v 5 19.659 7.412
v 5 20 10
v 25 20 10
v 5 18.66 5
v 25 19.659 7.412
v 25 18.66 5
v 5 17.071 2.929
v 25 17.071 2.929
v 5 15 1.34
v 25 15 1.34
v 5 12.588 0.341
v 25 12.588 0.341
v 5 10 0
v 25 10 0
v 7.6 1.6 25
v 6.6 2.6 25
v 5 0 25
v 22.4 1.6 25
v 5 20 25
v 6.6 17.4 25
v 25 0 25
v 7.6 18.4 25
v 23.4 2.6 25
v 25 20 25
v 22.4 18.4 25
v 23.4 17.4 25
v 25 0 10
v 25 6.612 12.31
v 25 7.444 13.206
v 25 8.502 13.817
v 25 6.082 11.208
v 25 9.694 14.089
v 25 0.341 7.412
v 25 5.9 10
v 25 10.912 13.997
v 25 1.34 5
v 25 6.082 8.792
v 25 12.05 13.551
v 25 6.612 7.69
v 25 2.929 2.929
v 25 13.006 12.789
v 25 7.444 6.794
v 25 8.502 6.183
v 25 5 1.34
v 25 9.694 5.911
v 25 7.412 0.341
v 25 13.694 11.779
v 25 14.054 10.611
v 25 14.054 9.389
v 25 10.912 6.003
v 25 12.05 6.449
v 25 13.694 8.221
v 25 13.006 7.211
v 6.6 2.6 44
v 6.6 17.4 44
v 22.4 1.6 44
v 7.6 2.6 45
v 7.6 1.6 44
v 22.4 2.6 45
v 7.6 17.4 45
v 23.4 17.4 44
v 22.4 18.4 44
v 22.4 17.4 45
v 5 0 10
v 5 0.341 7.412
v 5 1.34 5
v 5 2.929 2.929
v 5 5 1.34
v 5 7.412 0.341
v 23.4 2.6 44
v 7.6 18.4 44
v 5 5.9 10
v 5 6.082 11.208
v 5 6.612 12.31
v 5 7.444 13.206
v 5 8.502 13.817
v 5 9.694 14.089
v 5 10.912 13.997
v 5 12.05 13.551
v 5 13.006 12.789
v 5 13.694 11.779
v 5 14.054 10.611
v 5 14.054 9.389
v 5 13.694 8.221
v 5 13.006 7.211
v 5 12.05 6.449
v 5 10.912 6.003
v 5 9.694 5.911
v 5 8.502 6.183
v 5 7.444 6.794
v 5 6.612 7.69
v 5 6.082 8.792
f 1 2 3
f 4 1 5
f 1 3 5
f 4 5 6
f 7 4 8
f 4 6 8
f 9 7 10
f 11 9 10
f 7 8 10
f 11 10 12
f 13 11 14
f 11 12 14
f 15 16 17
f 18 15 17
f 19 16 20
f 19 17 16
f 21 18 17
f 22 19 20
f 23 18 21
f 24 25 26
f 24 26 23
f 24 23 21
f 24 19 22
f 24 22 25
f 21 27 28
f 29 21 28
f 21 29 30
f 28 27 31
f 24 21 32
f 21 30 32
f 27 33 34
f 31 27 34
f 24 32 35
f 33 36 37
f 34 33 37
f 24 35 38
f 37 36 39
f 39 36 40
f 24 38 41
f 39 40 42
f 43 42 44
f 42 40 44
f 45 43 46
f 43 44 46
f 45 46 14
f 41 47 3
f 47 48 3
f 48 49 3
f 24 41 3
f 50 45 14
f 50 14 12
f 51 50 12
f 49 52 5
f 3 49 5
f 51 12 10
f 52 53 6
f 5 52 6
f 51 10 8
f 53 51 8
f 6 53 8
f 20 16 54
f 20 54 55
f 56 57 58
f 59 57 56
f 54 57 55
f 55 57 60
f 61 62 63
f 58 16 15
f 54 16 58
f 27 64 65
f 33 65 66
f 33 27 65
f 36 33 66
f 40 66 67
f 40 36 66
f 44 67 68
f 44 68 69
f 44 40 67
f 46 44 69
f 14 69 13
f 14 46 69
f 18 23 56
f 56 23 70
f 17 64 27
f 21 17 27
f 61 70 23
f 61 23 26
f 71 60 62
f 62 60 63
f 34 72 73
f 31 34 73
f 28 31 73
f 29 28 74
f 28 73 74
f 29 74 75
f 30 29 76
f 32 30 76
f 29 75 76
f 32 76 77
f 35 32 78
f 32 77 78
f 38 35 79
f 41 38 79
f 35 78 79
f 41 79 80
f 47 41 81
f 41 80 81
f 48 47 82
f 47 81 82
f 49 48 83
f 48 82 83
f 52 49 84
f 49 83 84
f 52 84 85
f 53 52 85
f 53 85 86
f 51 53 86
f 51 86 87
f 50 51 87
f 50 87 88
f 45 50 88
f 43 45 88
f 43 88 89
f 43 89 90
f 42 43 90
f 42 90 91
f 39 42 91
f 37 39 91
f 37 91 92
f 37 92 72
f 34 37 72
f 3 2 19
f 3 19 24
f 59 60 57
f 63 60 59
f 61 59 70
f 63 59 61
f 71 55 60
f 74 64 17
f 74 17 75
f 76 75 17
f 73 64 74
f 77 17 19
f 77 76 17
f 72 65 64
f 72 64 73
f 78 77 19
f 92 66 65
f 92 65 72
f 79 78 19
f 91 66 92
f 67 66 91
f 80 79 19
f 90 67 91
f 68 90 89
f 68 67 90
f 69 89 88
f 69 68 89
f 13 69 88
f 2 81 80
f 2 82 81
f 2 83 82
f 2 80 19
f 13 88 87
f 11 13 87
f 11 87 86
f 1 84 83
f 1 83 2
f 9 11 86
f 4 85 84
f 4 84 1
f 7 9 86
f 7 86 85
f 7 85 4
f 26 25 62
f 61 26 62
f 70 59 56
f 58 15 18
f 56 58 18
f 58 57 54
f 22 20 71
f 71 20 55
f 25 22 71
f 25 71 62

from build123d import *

# Parameters (mm, degrees)
F0_W     = 20
F0_H     = 20
F1_DEPTH = 25
F2_W     = 16.8
F2_H     = 16.8
F3_DEPTH = 20
F4_SIZE  = 1
F5_R     = 9.99999
F7_D     = 8.2
F7_DEPTH = 35
F7_TIP   = 2.463528538


# Not quite as in the source:
# - a fillet or chamfer is up to 0.001 mm smaller than in the source, because OpenCascade refuses the exact size


with BuildPart() as f1:
    # F0 (on Top) → F1 (new body)
    with BuildSketch(Plane.XY):
        with Locations((15, 10)):
            Rectangle(F0_W, F0_H)
    extrude(amount=F1_DEPTH)

    # F2 (on face) → F3 (join)
    with BuildSketch(Plane.XY.offset(25)):
        with Locations((15, 10)):
            Rectangle(F2_W, F2_H)
    extrude(amount=F3_DEPTH)

    # F4
    f4_edges = [f1.edges().sort_by_distance(p)[0] for p in [
        (6.6, 18.4, 35),
        (6.6, 10, 45),
        (15, 18.4, 45),
        (23.4, 18.4, 35),
        (23.4, 10, 45),
        (15, 1.6, 45),
        (6.6, 1.6, 35),
        (23.4, 1.6, 35),
    ]]
    chamfer(f4_edges, length=F4_SIZE)

    # F5 (radius 10 in the source; OpenCascade refuses exactly that, so slightly less here)
    f5_edges = [f1.edges().sort_by_distance(p)[0] for p in [
        (15, 0, 0),
        (15, 20, 0),
    ]]
    fillet(f5_edges, radius=F5_R)

    # F7
    with Locations(Plane.YZ.offset(25)):
        with Locations((10, 10)):
            Hole(F7_D / 2, depth=F7_DEPTH)
            with Locations((0, 0, -(F7_DEPTH + F7_TIP / 2))):  # 118° drill point
                Cone(0, F7_D / 2, F7_TIP, mode=Mode.SUBTRACT)


solid = f1.part
